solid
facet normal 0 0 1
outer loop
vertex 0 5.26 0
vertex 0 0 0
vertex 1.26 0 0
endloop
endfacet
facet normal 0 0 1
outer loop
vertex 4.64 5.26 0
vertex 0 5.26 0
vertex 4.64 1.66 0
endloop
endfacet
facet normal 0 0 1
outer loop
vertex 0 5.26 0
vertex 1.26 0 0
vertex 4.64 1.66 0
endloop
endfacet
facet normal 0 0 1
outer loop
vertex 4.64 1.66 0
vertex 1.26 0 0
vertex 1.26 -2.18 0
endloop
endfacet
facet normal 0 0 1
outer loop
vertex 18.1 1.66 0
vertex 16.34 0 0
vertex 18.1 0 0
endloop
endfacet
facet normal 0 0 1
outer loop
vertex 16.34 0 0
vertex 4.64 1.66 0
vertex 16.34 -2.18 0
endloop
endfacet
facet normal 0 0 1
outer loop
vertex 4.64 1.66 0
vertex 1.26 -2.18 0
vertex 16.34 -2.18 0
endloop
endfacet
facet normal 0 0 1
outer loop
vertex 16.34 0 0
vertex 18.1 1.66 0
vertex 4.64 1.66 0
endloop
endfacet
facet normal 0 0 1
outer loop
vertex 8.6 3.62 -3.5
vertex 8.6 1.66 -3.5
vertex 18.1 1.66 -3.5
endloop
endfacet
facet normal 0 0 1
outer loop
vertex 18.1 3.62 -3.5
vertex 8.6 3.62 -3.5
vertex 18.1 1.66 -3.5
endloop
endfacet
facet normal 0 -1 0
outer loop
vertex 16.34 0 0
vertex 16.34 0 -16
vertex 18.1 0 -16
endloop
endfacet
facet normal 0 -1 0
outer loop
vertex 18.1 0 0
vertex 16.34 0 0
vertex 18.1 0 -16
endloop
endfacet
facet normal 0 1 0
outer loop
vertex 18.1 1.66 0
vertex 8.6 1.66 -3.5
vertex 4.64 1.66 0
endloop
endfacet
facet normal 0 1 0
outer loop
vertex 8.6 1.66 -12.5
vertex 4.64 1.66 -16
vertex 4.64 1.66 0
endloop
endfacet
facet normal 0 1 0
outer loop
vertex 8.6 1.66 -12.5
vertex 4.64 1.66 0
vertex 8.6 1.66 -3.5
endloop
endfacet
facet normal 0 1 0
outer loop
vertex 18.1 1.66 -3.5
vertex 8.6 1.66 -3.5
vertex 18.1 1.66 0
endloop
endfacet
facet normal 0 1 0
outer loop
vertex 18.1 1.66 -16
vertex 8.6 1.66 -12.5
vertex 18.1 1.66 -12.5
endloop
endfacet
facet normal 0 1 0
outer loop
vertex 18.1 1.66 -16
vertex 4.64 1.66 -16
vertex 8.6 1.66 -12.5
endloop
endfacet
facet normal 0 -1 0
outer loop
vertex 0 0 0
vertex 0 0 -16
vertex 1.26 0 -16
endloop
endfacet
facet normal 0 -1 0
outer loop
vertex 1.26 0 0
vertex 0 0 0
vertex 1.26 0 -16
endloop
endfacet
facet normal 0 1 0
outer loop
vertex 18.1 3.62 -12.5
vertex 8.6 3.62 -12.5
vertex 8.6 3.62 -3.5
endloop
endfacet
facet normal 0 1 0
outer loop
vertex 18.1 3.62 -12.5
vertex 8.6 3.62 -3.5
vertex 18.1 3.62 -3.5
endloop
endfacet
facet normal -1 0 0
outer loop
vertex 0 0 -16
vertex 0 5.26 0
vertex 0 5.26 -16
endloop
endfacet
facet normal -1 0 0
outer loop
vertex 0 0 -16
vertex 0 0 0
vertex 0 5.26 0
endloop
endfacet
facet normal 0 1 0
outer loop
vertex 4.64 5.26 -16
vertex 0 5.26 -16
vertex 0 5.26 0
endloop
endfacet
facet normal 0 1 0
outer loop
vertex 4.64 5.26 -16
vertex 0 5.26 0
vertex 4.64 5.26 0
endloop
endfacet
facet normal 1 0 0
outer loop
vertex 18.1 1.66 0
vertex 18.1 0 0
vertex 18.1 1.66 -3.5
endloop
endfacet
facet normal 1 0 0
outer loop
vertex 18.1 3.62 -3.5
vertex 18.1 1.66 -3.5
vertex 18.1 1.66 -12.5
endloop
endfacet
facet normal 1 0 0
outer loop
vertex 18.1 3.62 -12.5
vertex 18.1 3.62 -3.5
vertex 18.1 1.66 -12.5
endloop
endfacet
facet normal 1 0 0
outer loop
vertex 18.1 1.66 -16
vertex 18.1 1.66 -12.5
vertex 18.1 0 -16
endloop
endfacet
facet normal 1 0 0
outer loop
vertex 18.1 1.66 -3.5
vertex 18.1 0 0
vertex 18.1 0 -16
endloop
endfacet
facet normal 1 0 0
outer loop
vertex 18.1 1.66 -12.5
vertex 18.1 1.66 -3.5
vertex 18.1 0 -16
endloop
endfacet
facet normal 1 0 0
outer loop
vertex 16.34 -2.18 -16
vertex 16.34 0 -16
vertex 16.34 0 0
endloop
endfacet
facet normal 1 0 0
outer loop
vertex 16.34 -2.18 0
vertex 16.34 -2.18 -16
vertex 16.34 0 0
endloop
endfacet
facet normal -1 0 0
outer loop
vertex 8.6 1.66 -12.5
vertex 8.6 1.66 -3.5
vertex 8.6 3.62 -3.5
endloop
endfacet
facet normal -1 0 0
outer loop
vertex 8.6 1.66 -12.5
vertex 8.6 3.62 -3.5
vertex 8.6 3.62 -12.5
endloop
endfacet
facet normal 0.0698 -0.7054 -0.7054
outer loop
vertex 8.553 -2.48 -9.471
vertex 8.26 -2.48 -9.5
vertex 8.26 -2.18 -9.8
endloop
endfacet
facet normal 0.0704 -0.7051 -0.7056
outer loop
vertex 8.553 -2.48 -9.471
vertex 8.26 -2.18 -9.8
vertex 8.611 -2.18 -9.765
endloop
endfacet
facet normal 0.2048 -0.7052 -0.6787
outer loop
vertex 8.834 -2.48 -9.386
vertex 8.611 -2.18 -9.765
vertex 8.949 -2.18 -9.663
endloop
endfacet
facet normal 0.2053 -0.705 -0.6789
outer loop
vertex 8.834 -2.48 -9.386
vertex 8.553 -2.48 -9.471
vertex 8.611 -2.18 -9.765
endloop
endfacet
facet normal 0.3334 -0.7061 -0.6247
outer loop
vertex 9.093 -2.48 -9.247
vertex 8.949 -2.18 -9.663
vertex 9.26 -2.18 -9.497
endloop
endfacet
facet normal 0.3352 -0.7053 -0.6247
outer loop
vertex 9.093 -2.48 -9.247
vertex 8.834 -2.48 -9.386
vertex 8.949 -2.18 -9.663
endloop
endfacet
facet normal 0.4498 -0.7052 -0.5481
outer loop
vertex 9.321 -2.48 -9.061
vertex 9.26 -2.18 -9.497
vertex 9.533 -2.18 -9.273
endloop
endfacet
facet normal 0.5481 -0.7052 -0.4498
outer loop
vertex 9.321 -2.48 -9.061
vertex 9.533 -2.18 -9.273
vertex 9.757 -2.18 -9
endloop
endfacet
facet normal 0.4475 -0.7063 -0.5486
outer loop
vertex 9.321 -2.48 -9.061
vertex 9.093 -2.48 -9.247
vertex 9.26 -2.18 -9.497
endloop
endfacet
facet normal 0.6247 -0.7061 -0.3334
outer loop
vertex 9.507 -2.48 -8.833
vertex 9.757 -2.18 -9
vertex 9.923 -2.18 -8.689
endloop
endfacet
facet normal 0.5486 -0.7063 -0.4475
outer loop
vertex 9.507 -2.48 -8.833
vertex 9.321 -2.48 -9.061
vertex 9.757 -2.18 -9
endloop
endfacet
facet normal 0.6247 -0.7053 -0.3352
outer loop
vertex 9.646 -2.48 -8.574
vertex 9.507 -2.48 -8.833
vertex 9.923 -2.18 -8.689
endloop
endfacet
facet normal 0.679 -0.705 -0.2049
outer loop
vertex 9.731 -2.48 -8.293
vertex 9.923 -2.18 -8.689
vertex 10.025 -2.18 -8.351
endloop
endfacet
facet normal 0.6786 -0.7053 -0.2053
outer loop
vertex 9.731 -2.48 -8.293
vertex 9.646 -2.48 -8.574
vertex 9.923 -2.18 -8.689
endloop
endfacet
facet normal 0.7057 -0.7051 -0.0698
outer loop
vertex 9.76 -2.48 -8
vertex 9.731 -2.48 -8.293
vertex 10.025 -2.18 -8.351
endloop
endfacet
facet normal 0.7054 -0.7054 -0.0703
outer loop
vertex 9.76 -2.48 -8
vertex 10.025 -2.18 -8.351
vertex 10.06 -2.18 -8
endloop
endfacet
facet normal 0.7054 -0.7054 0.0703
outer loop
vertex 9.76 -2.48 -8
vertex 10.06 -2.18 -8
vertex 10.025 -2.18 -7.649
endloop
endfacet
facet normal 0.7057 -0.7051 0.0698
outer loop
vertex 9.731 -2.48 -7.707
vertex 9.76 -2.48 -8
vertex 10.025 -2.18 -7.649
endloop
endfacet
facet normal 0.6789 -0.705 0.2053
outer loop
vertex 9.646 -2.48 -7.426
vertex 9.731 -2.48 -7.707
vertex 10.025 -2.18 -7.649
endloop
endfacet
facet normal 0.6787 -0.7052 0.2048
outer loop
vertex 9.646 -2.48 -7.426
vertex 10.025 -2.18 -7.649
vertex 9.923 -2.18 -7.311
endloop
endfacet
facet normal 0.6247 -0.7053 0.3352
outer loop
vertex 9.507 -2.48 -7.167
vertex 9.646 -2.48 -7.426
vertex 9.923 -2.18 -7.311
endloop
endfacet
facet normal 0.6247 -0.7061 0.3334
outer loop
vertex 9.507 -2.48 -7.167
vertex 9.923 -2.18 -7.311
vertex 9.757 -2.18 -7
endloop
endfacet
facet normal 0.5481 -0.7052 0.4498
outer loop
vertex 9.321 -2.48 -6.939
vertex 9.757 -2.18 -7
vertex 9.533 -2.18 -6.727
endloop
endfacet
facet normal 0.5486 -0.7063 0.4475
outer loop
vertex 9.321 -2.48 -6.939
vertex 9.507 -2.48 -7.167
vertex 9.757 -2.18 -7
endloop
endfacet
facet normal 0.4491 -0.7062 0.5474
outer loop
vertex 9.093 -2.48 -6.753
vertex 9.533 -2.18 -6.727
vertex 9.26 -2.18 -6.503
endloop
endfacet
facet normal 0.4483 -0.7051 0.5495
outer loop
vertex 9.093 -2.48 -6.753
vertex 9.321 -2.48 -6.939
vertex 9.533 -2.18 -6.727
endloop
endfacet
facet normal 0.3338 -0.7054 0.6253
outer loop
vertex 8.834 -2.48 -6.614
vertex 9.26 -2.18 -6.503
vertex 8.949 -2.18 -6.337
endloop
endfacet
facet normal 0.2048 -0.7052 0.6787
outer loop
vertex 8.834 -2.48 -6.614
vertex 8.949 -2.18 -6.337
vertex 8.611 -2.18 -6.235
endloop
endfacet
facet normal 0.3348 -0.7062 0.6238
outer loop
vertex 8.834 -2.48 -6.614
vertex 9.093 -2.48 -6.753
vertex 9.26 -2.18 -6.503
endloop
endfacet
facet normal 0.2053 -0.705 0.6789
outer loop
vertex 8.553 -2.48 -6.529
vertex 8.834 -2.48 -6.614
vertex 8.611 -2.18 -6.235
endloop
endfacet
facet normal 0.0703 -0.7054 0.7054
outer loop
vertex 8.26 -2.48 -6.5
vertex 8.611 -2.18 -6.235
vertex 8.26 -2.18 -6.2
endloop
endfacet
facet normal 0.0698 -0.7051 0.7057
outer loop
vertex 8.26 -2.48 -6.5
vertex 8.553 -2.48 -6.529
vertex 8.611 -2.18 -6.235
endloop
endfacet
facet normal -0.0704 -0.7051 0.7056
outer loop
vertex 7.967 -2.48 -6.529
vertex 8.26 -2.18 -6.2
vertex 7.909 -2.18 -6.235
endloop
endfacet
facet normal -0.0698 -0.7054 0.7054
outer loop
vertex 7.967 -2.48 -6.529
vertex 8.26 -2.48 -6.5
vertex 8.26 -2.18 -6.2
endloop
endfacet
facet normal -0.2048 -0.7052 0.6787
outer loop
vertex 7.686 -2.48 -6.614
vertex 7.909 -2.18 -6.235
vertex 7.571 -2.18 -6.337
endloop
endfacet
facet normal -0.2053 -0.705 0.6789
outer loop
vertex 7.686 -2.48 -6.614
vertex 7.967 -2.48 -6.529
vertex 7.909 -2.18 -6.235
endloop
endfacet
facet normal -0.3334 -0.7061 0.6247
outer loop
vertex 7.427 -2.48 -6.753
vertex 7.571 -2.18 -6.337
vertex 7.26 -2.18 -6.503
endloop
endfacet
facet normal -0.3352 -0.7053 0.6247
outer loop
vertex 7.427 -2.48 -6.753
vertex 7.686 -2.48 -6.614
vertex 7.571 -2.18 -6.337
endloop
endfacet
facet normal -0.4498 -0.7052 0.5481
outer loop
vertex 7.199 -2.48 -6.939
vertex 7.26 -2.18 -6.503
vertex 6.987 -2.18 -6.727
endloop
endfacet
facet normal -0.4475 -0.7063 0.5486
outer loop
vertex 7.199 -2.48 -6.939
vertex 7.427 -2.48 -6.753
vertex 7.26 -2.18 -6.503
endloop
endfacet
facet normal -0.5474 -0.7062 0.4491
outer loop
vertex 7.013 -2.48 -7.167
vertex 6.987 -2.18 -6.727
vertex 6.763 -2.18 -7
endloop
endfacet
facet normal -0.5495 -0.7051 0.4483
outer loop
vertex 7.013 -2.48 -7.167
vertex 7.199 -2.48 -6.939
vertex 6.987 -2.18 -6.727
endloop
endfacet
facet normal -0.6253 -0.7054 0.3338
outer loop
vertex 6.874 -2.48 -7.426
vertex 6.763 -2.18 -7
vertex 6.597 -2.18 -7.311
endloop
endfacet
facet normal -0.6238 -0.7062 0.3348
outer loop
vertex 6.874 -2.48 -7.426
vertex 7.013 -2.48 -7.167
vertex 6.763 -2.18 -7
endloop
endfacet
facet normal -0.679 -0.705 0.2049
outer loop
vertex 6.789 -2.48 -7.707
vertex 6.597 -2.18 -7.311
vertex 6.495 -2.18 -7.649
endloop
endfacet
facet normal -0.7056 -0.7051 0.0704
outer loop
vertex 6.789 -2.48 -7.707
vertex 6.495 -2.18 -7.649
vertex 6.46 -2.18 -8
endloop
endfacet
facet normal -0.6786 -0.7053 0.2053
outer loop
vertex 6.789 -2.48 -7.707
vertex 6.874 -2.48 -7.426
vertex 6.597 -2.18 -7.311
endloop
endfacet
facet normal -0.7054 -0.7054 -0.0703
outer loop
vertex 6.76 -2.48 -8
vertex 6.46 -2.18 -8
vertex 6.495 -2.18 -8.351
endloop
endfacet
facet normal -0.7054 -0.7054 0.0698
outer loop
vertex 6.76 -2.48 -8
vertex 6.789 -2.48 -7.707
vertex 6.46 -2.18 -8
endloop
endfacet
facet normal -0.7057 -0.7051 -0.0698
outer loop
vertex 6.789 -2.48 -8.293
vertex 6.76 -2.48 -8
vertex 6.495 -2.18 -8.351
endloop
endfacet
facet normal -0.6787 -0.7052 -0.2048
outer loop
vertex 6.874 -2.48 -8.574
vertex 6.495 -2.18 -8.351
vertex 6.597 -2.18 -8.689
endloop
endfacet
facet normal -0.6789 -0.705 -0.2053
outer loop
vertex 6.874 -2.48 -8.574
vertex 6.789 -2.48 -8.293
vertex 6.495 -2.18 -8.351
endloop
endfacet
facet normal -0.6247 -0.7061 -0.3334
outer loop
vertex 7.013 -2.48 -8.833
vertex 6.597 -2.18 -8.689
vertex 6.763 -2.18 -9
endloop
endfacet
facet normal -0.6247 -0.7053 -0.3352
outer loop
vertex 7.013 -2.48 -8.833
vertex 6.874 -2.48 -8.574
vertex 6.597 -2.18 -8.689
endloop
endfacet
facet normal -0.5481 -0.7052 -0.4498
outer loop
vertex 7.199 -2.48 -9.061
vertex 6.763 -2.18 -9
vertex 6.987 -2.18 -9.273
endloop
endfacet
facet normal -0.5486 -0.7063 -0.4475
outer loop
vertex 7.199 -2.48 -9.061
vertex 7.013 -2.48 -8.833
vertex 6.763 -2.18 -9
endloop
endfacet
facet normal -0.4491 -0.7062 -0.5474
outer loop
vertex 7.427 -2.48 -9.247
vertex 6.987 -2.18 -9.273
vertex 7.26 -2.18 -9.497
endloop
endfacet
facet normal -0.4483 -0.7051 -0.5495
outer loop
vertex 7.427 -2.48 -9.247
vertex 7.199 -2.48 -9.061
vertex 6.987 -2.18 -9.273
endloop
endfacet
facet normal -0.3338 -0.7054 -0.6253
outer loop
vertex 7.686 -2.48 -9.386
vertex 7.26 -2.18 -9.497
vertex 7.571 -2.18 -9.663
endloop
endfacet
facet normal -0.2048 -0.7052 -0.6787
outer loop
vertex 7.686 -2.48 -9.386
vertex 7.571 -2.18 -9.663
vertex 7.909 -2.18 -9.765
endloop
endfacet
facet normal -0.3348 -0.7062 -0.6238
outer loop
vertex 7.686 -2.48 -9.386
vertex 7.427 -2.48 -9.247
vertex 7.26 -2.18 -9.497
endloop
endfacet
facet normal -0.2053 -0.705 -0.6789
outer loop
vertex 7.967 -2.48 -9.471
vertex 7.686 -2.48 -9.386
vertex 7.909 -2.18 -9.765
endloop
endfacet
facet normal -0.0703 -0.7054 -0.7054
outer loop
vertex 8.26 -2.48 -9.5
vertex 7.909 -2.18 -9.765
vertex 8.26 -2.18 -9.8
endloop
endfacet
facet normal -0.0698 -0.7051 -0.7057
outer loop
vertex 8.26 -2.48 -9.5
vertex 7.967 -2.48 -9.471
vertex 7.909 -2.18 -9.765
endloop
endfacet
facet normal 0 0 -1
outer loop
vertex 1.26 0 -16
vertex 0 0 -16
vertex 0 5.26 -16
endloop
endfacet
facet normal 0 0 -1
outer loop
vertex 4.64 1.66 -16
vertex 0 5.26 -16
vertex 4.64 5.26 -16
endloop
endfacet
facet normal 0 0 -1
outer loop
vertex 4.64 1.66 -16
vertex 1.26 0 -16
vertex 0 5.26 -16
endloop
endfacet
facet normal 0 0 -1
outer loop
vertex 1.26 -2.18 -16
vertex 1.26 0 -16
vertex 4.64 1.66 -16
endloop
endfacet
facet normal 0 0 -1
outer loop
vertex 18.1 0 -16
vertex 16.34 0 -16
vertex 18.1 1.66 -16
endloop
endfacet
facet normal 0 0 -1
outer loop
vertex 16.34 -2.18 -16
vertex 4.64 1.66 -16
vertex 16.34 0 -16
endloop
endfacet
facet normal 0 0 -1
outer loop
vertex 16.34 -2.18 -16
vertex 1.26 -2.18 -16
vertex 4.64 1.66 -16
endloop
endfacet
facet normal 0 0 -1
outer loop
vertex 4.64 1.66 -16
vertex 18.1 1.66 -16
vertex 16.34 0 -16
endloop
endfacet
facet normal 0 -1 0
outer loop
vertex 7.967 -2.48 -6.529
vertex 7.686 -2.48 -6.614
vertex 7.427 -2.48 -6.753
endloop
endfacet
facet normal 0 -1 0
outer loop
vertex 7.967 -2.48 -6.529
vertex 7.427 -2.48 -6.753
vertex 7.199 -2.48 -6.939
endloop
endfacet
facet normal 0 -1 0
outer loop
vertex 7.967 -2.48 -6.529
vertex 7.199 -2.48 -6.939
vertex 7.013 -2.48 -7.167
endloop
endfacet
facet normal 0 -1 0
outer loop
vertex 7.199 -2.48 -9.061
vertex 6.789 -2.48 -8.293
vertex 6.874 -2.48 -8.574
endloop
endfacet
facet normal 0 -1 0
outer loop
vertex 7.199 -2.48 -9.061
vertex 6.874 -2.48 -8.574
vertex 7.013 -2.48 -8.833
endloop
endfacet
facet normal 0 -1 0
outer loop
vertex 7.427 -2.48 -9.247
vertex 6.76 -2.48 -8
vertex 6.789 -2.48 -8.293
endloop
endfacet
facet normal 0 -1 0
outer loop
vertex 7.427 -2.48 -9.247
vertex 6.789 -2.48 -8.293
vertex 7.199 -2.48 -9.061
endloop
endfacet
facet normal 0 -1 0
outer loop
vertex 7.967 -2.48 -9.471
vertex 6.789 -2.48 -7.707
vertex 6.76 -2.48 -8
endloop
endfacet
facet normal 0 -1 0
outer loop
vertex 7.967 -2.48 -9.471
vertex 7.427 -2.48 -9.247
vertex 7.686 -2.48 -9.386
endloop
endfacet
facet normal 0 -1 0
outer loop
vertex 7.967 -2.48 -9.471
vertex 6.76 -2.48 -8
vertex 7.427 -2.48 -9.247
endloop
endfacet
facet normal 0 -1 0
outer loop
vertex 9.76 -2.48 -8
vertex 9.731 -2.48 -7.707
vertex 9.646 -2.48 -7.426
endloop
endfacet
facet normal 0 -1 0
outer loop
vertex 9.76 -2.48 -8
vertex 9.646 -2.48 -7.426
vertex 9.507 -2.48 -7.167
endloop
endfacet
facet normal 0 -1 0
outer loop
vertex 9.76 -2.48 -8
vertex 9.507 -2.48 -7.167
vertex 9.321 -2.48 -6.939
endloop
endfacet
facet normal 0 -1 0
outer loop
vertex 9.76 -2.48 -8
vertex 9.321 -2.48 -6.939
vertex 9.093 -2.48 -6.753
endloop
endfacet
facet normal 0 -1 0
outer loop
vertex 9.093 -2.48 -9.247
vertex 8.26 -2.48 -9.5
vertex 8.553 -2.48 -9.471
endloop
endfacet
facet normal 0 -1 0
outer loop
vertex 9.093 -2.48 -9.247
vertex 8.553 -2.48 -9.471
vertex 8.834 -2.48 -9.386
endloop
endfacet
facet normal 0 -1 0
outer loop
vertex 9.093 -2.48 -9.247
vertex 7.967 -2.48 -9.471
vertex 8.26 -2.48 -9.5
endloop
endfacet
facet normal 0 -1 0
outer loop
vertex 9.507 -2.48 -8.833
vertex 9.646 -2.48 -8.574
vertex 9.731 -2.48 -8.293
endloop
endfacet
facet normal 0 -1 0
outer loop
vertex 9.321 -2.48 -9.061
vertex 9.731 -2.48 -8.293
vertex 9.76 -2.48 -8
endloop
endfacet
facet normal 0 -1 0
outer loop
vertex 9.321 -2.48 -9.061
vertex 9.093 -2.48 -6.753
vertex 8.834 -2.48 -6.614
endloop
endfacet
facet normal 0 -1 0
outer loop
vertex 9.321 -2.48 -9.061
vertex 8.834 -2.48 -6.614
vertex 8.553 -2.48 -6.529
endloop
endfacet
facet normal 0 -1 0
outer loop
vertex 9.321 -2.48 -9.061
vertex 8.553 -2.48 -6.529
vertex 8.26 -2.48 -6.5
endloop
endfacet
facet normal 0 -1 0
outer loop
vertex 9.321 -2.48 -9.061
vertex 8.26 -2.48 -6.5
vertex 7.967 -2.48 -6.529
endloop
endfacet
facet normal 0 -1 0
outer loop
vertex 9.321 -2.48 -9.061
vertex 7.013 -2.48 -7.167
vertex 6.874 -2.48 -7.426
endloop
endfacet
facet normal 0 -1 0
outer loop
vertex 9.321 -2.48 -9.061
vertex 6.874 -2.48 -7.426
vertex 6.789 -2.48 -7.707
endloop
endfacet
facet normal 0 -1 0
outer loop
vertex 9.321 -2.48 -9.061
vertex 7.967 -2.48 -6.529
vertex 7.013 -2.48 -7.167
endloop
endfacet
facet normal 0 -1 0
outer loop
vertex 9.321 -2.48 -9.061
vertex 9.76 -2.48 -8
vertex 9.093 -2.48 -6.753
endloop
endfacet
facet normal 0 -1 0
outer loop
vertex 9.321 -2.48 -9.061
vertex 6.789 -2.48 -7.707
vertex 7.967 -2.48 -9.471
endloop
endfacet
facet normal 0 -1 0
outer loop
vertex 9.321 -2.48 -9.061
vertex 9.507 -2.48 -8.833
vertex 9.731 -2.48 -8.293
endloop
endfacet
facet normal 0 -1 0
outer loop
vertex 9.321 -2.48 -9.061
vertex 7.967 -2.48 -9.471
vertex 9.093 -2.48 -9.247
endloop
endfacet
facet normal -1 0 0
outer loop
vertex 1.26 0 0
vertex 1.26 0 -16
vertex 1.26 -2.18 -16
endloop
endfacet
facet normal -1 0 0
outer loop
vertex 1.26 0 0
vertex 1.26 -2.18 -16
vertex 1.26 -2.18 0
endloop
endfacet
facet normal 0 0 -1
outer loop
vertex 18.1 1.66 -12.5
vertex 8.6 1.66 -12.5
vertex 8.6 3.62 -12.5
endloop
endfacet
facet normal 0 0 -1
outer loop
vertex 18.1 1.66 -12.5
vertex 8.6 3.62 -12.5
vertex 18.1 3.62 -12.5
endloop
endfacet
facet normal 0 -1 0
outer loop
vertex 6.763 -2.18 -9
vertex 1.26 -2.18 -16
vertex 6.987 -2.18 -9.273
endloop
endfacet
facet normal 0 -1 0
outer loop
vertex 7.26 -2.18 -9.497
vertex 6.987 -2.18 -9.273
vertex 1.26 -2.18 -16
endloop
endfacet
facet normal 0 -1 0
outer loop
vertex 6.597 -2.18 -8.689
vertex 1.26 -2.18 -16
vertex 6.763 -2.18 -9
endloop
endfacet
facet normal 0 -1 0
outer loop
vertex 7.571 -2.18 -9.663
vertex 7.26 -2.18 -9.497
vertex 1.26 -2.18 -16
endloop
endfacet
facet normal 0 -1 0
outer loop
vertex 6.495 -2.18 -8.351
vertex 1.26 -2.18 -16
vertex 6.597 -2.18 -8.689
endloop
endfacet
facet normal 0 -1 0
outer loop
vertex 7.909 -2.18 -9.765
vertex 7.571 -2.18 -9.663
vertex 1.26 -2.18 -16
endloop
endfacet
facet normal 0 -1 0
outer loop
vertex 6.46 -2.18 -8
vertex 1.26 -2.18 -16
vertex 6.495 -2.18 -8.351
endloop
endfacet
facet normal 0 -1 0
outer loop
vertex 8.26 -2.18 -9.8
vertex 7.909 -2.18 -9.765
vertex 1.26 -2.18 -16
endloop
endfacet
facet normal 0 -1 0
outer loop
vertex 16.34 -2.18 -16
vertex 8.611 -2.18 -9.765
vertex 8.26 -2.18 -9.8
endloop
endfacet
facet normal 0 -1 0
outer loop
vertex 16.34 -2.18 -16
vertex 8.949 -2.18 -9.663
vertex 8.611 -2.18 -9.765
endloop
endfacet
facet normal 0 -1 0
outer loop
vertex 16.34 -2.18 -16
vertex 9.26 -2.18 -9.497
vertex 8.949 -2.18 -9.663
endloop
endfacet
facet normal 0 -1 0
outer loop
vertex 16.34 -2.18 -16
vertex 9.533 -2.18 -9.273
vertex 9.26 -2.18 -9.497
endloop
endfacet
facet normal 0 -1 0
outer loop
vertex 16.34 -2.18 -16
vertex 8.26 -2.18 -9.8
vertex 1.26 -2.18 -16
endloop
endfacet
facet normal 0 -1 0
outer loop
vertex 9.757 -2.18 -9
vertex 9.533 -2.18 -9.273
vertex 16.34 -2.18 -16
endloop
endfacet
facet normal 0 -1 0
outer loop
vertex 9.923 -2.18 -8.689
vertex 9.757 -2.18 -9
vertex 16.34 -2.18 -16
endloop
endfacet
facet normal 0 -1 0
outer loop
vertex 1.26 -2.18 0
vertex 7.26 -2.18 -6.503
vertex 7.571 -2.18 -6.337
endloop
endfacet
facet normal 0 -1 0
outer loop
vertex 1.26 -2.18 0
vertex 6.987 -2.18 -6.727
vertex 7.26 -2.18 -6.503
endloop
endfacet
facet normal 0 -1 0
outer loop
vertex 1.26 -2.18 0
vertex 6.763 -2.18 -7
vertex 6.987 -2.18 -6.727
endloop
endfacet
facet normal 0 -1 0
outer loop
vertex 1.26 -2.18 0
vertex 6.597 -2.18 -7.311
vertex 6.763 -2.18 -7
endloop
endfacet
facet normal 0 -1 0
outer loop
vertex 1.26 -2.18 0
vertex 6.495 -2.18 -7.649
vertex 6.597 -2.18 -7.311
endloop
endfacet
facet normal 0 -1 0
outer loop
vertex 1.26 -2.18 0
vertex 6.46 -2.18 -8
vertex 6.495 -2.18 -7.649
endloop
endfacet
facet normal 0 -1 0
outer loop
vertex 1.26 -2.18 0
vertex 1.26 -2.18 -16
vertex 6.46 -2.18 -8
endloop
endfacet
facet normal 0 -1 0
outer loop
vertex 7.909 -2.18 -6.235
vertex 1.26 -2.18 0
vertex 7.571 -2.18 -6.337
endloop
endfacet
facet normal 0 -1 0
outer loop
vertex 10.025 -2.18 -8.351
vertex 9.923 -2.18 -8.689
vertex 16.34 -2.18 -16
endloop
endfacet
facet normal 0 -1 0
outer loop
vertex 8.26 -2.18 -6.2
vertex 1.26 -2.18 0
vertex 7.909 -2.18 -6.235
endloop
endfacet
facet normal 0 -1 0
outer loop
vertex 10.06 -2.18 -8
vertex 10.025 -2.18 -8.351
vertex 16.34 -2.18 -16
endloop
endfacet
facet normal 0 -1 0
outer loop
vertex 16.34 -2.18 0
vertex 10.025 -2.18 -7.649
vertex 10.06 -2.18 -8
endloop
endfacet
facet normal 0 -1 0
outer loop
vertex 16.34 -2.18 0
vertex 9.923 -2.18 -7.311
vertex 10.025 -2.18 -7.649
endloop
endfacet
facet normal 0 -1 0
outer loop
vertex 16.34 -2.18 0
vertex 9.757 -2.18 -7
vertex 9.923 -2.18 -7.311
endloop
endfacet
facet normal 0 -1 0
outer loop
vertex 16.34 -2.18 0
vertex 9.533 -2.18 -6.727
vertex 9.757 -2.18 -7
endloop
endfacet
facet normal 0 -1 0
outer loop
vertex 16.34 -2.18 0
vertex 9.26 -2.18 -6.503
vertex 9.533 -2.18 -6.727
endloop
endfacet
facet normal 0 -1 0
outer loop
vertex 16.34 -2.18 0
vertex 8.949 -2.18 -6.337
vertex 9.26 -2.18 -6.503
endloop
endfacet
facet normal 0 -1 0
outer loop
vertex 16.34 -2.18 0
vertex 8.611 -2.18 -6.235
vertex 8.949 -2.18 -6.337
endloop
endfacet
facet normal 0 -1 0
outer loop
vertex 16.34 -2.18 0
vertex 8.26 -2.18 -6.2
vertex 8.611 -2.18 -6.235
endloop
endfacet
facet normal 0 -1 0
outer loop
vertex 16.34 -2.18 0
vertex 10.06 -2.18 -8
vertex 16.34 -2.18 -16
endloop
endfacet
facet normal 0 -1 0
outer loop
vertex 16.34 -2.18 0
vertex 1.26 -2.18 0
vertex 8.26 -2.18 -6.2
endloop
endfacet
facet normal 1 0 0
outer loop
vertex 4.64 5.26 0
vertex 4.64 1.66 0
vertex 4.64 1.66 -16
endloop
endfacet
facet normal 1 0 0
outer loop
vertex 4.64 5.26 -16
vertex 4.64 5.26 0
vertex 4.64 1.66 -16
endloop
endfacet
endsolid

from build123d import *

# Parameters (mm, degrees)
SKETCH_1_W      = 18.1
SKETCH_1_H      = 16
EXTRUDE_1_DEPTH = 1.66
SKETCH_2_W      = 15.08
SKETCH_2_H      = 16
EXTRUDE_2_DEPTH = 2.18
SKETCH_3_W      = 9.5
SKETCH_3_H      = 9
EXTRUDE_3_DEPTH = 1.96
SKETCH_4_W      = 4.64
SKETCH_4_H      = 16
EXTRUDE_4_DEPTH = 3.6
SKETCH_5_R      = 1.5
EXTRUDE_5_DEPTH = 0.3
CHAMFER_1_SIZE  = 0.3


with BuildPart() as part:
    # 草图1 → 凸台-拉伸1 (new body)
    with BuildSketch(Plane(origin=(0, 0, 0), x_dir=(1, 0, 0), z_dir=(0, 1, 0))):
        with Locations((9.05, 8)):
            Rectangle(SKETCH_1_W, SKETCH_1_H)
    extrude(amount=EXTRUDE_1_DEPTH)

    # 草图2 → 凸台-拉伸2 (add)
    with BuildSketch(Plane.XZ):
        with Locations((8.8, -8)):
            Rectangle(SKETCH_2_W, SKETCH_2_H)
    extrude(amount=EXTRUDE_2_DEPTH)

    # 草图3 → 凸台-拉伸3 (add)
    with BuildSketch(Plane(origin=(0, 1.66, 0), x_dir=(1, 0, 0), z_dir=(0, 1, 0))):
        with Locations((13.35, 8)):
            Rectangle(SKETCH_3_W, SKETCH_3_H)
    extrude(amount=EXTRUDE_3_DEPTH)

    # 草图4 → 凸台-拉伸4 (add)
    with BuildSketch(Plane(origin=(0, 1.66, 0), x_dir=(1, 0, 0), z_dir=(0, 1, 0))):
        with Locations((2.32, 8)):
            Rectangle(SKETCH_4_W, SKETCH_4_H)
    extrude(amount=EXTRUDE_4_DEPTH)

    # 草图5 → 凸台-拉伸5 (add)
    with BuildSketch(Plane.XZ.offset(2.18)):
        with Locations(Location((8.26, -8, 0), (0, 0, 270))):
            Circle(SKETCH_5_R)
    extrude(amount=EXTRUDE_5_DEPTH)

    # 倒角1
    chamfer_1_edges = [part.edges().sort_by_distance(p)[0] for p in [
        (8.26, -2.18, -6.5),
    ]]
    chamfer(chamfer_1_edges, length=CHAMFER_1_SIZE - 0.0001)  # a hair under: the kernel refuses the full size


solid = part.part
